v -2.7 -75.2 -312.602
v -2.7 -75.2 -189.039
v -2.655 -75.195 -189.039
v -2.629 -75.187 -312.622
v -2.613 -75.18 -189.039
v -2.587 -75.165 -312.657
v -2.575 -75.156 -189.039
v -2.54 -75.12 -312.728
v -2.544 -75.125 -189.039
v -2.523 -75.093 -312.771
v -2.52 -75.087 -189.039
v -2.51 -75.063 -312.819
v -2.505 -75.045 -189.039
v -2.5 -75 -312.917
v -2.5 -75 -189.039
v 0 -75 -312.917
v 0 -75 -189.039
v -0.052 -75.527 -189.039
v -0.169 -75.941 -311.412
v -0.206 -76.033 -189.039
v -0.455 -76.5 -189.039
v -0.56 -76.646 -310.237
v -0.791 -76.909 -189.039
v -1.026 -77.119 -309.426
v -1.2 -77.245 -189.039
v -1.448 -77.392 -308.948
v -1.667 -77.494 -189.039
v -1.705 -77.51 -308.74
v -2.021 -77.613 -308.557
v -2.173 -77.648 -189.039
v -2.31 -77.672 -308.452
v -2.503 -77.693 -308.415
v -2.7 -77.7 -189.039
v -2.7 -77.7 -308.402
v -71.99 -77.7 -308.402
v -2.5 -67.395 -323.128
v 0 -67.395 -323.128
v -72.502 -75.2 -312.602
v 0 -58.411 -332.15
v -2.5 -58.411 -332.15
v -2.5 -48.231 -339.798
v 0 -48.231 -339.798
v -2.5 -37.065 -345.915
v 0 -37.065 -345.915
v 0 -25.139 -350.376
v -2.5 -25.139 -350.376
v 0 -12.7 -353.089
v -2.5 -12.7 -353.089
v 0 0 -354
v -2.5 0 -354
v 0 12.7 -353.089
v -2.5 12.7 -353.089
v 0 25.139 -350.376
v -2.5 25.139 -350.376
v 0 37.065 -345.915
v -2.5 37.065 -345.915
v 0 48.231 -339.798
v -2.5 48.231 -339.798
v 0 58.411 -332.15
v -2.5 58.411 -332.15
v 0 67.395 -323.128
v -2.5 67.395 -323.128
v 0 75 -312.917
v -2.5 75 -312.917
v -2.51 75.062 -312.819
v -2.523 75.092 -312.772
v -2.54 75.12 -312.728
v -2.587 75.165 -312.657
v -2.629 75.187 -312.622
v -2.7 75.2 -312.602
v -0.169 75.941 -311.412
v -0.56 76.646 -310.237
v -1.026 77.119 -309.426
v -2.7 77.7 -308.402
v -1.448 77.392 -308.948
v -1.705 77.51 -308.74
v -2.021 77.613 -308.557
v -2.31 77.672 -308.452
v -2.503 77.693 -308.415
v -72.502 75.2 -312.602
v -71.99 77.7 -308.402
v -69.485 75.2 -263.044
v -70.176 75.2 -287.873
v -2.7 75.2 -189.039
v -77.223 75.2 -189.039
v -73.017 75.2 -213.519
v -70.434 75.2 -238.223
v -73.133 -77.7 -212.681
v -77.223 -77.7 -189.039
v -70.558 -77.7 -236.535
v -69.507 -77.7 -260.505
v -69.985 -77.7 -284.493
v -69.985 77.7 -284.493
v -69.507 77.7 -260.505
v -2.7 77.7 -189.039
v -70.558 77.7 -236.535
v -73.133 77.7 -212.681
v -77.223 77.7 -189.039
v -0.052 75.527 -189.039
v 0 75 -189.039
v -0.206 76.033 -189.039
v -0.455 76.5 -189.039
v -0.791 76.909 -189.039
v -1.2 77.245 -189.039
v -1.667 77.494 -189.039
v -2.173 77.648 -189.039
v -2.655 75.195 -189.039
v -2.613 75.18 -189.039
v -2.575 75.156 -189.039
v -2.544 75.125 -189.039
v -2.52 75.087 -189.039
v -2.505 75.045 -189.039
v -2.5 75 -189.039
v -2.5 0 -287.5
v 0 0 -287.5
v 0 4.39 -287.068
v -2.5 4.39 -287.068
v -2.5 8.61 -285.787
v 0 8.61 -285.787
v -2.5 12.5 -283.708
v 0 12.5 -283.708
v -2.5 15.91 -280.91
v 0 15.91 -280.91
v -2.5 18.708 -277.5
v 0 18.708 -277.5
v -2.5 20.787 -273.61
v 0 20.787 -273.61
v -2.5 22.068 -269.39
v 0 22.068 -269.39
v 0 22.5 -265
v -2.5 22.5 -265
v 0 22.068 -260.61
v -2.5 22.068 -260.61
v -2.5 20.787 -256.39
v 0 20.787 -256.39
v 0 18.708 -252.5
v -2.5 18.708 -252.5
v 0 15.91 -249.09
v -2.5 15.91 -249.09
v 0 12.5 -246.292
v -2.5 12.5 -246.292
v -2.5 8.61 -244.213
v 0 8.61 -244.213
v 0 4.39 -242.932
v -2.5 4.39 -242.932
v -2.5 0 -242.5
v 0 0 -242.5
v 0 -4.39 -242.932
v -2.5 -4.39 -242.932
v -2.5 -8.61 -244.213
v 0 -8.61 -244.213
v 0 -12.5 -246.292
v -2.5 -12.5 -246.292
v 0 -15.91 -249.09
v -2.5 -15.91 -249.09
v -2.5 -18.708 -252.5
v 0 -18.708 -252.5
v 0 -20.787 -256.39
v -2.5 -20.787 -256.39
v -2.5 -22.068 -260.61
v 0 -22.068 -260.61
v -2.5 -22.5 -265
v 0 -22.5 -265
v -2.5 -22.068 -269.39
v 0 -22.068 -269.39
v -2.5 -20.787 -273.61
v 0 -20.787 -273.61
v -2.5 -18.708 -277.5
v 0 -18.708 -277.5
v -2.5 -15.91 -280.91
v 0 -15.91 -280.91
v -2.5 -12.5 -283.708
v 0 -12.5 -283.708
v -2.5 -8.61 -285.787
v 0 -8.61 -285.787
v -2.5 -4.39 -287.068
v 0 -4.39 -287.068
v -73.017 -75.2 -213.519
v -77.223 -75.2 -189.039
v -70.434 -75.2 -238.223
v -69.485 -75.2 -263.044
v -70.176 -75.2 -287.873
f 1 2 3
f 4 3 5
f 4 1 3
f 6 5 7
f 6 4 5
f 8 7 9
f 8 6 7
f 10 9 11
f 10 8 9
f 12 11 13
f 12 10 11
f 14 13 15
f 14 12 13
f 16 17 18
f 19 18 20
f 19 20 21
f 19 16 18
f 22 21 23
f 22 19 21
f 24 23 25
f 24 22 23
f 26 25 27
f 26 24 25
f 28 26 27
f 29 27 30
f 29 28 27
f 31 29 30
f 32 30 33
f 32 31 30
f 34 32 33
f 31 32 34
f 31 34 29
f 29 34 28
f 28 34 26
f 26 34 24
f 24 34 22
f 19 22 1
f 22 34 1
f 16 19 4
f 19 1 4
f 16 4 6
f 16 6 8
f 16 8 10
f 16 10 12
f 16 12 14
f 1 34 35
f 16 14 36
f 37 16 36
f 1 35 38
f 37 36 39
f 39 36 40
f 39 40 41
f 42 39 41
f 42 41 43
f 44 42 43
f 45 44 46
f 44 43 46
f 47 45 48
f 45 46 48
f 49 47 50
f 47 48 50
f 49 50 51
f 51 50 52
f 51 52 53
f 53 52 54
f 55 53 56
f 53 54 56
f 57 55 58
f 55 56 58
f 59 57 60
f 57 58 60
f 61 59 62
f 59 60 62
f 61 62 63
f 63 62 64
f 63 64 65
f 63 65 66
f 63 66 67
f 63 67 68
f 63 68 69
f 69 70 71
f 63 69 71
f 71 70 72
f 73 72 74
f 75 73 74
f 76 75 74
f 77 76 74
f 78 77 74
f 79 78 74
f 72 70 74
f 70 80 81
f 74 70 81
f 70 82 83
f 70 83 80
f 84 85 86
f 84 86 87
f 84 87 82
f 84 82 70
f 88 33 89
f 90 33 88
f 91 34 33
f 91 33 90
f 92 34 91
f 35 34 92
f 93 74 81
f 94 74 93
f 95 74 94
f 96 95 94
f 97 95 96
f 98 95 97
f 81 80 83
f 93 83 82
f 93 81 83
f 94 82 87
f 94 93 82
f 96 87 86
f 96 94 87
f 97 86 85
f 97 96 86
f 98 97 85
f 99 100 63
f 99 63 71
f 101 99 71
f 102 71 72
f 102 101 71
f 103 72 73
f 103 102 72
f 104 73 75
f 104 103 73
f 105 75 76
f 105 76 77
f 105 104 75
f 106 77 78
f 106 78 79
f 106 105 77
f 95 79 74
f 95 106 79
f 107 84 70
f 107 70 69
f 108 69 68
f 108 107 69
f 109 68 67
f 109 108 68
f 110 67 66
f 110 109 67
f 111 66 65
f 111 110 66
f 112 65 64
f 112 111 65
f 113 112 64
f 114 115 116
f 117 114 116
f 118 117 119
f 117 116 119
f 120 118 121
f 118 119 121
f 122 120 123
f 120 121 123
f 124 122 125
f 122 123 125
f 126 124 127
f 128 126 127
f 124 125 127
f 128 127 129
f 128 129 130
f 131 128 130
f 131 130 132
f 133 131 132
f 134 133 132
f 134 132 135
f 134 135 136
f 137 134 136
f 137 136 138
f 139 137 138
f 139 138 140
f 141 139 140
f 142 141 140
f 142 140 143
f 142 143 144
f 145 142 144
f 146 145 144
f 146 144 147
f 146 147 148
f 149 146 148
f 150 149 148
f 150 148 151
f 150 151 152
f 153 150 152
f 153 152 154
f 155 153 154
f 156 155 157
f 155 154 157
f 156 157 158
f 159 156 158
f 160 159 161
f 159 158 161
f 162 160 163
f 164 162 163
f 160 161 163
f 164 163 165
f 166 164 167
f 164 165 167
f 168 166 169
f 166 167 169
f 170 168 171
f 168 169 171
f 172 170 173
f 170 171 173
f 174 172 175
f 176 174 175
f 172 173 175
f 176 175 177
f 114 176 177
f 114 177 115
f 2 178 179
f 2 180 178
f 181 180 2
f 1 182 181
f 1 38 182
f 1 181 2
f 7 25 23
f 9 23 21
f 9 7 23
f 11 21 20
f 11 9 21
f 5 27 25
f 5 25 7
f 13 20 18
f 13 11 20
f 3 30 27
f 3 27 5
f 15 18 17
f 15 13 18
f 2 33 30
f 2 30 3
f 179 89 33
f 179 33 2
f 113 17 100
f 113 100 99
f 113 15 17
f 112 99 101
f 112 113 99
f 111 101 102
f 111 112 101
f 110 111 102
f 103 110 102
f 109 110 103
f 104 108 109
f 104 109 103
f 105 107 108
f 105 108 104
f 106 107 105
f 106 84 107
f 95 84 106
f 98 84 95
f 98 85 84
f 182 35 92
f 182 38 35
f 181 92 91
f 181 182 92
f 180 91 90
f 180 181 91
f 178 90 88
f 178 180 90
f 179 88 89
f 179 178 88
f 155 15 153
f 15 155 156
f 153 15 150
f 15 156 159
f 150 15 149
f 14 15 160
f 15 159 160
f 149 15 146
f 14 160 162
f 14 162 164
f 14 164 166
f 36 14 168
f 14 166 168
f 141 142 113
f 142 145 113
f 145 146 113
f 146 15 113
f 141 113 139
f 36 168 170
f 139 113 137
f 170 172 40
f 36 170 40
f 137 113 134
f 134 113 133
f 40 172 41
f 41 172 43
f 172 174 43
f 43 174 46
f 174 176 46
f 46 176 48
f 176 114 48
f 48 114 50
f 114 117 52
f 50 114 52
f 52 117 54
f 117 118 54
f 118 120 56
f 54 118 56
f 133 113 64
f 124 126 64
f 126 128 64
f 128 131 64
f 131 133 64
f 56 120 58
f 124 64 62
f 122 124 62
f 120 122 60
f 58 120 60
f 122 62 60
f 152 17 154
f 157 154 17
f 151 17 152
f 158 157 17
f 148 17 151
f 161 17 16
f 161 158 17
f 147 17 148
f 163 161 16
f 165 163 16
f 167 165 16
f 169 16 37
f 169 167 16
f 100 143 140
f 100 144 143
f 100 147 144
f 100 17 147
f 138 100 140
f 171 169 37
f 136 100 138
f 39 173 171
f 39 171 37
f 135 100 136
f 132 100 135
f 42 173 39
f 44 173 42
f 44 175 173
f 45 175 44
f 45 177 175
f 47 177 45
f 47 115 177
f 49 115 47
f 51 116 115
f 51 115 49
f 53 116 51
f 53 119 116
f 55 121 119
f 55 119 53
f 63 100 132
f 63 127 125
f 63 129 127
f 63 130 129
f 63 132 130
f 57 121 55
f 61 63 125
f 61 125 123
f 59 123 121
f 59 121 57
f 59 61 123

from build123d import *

# Parameters (mm, degrees)
SKETCH1_W               = 730
SKETCH1_H               = 150
BASE_FLANGE1_DEPTH      = 2.5
EDGE_FLANGE1_DEPTH      = 730
EDGE_FLANGE1_BEND_DEPTH = 730
SKETCH13_R              = 22.5
CUT_EXTRUDE2_DEPTH      = 10
CUT_EXTRUDE3_DEPTH      = 396.173746598
CUT_EXTRUDE3_DEPTH_BACK = 396.173746598
SKETCH14_W              = 631.337566112
SKETCH14_H              = 273.157514278
CUT_EXTRUDE4_DEPTH      = 396.173746598
CUT_EXTRUDE4_DEPTH_BACK = 396.173746598
CUT_EXTRUDE5_DEPTH      = 408.87885472


# Sheet-metal steps are written as plain solids
with BuildPart() as part:
    # Sketch1 → Base-Flange1 (new body)
    with BuildSketch(Plane(origin=(0, 0, 0), x_dir=(0, 0, -1), z_dir=(1, 0, 0))):
        Rectangle(SKETCH1_W, SKETCH1_H)
    extrude(amount=-BASE_FLANGE1_DEPTH)

    # Edge-Flange1 section (across the edge) → Edge-Flange1 (add)
    with BuildSketch(Plane(origin=(-2.5, 75.2, 365), x_dir=(0, -1, 0), z_dir=(0, 0, -1))):
        with BuildLine():
            Line((-2.5, 0.2), (-2.5, 127.5))
            Line((-2.5, 127.5), (0, 127.5))
            Line((0, 127.5), (0, 0.2))
            ThreePointArc((0, 0.2), (0.058578644, 0.058578644), (0.2, 0))
            Line((0.2, 0), (0.2, -2.5))
            ThreePointArc((0.2, -2.5), (-1.709188309, -1.709188309), (-2.5, 0.2))
        make_face()
    extrude(amount=EDGE_FLANGE1_DEPTH)

    # Edge-Flange1 section 2 (across the edge) → Edge-Flange1 bend (add)
    with BuildSketch(Plane(origin=(-2.5, -75.2, -365), x_dir=(0, 1, 0), z_dir=(0, 0, 1))):
        with BuildLine():
            Line((-2.5, 0.2), (-2.5, 127.5))
            Line((-2.5, 127.5), (0, 127.5))
            Line((0, 127.5), (0, 0.2))
            ThreePointArc((0, 0.2), (0.058578644, 0.058578644), (0.2, 0))
            Line((0.2, 0), (0.2, -2.5))
            ThreePointArc((0.2, -2.5), (-1.709188309, -1.709188309), (-2.5, 0.2))
        make_face()
    extrude(amount=EDGE_FLANGE1_BEND_DEPTH)

    # Sketch13 → Cut-Extrude2 (cut)
    with BuildSketch(Plane(origin=(0, 0, 0), x_dir=(0, 0, -1), z_dir=(1, 0, 0))):
        with Locations((265, 0)):
            Circle(SKETCH13_R)
        with Locations((-290, 0)):
            Circle(SKETCH13_R)
    extrude(amount=-CUT_EXTRUDE2_DEPTH, mode=Mode.SUBTRACT)

    # Sketch14 → Cut-Extrude3 (cut, two sides: drawn at the far end of the back side and taken through both)
    with BuildSketch(Plane(origin=(0, 0, 0), x_dir=(0, 0, -1), z_dir=(1, 0, 0)).offset(-CUT_EXTRUDE3_DEPTH_BACK)):
        with Locations((-126.629311255, -14.019673746)):
            Rectangle(SKETCH14_W, SKETCH14_H)
    extrude(amount=CUT_EXTRUDE3_DEPTH + CUT_EXTRUDE3_DEPTH_BACK, mode=Mode.SUBTRACT)

    # Sketch15 → Cut-Extrude4 (cut, two sides: drawn at the far end of the back side and taken through both)
    with BuildSketch(Plane(origin=(0, 0, 0), x_dir=(0, 0, -1), z_dir=(1, 0, 0)).offset(-CUT_EXTRUDE4_DEPTH_BACK)):
        with BuildLine():
            Line((302.266550641, 80.822052704), (310.532003477, 105.351783703))
            Line((310.532003477, 105.351783703), (400.668447303, 94.566226322))
            Line((400.668447303, 94.566226322), (380.252927975, -108.048173048))
            Line((380.252927975, -108.048173048), (291.286888445, -85.029403714))
            ThreePointArc((291.286888445, -85.029403714), (353.805609642, -5.879089735), (302.266550641, 80.822052704))
        make_face()
    extrude(amount=CUT_EXTRUDE4_DEPTH + CUT_EXTRUDE4_DEPTH_BACK, mode=Mode.SUBTRACT)

    # Sketch17 → Cut-Extrude5 (cut, through all)
    with BuildSketch(Plane(origin=(0, 77.7, 0), x_dir=(1, 0, 0), z_dir=(0, 1, 0))):
        with BuildLine():
            Line((-169.942990536, 157.436912633), (-165.65841416, 335.00880021))
            Line((-165.65841416, 335.00880021), (-74.315703794, 325.146670386))
            ThreePointArc((-74.315703794, 325.146670386), (-69.663025193, 253.273874783), (-78.78147448, 181.830190328))
            Line((-78.78147448, 181.830190328), (-169.942990536, 157.436912633))
        make_face()
    extrude(amount=-CUT_EXTRUDE5_DEPTH, mode=Mode.SUBTRACT)


solid = part.part
